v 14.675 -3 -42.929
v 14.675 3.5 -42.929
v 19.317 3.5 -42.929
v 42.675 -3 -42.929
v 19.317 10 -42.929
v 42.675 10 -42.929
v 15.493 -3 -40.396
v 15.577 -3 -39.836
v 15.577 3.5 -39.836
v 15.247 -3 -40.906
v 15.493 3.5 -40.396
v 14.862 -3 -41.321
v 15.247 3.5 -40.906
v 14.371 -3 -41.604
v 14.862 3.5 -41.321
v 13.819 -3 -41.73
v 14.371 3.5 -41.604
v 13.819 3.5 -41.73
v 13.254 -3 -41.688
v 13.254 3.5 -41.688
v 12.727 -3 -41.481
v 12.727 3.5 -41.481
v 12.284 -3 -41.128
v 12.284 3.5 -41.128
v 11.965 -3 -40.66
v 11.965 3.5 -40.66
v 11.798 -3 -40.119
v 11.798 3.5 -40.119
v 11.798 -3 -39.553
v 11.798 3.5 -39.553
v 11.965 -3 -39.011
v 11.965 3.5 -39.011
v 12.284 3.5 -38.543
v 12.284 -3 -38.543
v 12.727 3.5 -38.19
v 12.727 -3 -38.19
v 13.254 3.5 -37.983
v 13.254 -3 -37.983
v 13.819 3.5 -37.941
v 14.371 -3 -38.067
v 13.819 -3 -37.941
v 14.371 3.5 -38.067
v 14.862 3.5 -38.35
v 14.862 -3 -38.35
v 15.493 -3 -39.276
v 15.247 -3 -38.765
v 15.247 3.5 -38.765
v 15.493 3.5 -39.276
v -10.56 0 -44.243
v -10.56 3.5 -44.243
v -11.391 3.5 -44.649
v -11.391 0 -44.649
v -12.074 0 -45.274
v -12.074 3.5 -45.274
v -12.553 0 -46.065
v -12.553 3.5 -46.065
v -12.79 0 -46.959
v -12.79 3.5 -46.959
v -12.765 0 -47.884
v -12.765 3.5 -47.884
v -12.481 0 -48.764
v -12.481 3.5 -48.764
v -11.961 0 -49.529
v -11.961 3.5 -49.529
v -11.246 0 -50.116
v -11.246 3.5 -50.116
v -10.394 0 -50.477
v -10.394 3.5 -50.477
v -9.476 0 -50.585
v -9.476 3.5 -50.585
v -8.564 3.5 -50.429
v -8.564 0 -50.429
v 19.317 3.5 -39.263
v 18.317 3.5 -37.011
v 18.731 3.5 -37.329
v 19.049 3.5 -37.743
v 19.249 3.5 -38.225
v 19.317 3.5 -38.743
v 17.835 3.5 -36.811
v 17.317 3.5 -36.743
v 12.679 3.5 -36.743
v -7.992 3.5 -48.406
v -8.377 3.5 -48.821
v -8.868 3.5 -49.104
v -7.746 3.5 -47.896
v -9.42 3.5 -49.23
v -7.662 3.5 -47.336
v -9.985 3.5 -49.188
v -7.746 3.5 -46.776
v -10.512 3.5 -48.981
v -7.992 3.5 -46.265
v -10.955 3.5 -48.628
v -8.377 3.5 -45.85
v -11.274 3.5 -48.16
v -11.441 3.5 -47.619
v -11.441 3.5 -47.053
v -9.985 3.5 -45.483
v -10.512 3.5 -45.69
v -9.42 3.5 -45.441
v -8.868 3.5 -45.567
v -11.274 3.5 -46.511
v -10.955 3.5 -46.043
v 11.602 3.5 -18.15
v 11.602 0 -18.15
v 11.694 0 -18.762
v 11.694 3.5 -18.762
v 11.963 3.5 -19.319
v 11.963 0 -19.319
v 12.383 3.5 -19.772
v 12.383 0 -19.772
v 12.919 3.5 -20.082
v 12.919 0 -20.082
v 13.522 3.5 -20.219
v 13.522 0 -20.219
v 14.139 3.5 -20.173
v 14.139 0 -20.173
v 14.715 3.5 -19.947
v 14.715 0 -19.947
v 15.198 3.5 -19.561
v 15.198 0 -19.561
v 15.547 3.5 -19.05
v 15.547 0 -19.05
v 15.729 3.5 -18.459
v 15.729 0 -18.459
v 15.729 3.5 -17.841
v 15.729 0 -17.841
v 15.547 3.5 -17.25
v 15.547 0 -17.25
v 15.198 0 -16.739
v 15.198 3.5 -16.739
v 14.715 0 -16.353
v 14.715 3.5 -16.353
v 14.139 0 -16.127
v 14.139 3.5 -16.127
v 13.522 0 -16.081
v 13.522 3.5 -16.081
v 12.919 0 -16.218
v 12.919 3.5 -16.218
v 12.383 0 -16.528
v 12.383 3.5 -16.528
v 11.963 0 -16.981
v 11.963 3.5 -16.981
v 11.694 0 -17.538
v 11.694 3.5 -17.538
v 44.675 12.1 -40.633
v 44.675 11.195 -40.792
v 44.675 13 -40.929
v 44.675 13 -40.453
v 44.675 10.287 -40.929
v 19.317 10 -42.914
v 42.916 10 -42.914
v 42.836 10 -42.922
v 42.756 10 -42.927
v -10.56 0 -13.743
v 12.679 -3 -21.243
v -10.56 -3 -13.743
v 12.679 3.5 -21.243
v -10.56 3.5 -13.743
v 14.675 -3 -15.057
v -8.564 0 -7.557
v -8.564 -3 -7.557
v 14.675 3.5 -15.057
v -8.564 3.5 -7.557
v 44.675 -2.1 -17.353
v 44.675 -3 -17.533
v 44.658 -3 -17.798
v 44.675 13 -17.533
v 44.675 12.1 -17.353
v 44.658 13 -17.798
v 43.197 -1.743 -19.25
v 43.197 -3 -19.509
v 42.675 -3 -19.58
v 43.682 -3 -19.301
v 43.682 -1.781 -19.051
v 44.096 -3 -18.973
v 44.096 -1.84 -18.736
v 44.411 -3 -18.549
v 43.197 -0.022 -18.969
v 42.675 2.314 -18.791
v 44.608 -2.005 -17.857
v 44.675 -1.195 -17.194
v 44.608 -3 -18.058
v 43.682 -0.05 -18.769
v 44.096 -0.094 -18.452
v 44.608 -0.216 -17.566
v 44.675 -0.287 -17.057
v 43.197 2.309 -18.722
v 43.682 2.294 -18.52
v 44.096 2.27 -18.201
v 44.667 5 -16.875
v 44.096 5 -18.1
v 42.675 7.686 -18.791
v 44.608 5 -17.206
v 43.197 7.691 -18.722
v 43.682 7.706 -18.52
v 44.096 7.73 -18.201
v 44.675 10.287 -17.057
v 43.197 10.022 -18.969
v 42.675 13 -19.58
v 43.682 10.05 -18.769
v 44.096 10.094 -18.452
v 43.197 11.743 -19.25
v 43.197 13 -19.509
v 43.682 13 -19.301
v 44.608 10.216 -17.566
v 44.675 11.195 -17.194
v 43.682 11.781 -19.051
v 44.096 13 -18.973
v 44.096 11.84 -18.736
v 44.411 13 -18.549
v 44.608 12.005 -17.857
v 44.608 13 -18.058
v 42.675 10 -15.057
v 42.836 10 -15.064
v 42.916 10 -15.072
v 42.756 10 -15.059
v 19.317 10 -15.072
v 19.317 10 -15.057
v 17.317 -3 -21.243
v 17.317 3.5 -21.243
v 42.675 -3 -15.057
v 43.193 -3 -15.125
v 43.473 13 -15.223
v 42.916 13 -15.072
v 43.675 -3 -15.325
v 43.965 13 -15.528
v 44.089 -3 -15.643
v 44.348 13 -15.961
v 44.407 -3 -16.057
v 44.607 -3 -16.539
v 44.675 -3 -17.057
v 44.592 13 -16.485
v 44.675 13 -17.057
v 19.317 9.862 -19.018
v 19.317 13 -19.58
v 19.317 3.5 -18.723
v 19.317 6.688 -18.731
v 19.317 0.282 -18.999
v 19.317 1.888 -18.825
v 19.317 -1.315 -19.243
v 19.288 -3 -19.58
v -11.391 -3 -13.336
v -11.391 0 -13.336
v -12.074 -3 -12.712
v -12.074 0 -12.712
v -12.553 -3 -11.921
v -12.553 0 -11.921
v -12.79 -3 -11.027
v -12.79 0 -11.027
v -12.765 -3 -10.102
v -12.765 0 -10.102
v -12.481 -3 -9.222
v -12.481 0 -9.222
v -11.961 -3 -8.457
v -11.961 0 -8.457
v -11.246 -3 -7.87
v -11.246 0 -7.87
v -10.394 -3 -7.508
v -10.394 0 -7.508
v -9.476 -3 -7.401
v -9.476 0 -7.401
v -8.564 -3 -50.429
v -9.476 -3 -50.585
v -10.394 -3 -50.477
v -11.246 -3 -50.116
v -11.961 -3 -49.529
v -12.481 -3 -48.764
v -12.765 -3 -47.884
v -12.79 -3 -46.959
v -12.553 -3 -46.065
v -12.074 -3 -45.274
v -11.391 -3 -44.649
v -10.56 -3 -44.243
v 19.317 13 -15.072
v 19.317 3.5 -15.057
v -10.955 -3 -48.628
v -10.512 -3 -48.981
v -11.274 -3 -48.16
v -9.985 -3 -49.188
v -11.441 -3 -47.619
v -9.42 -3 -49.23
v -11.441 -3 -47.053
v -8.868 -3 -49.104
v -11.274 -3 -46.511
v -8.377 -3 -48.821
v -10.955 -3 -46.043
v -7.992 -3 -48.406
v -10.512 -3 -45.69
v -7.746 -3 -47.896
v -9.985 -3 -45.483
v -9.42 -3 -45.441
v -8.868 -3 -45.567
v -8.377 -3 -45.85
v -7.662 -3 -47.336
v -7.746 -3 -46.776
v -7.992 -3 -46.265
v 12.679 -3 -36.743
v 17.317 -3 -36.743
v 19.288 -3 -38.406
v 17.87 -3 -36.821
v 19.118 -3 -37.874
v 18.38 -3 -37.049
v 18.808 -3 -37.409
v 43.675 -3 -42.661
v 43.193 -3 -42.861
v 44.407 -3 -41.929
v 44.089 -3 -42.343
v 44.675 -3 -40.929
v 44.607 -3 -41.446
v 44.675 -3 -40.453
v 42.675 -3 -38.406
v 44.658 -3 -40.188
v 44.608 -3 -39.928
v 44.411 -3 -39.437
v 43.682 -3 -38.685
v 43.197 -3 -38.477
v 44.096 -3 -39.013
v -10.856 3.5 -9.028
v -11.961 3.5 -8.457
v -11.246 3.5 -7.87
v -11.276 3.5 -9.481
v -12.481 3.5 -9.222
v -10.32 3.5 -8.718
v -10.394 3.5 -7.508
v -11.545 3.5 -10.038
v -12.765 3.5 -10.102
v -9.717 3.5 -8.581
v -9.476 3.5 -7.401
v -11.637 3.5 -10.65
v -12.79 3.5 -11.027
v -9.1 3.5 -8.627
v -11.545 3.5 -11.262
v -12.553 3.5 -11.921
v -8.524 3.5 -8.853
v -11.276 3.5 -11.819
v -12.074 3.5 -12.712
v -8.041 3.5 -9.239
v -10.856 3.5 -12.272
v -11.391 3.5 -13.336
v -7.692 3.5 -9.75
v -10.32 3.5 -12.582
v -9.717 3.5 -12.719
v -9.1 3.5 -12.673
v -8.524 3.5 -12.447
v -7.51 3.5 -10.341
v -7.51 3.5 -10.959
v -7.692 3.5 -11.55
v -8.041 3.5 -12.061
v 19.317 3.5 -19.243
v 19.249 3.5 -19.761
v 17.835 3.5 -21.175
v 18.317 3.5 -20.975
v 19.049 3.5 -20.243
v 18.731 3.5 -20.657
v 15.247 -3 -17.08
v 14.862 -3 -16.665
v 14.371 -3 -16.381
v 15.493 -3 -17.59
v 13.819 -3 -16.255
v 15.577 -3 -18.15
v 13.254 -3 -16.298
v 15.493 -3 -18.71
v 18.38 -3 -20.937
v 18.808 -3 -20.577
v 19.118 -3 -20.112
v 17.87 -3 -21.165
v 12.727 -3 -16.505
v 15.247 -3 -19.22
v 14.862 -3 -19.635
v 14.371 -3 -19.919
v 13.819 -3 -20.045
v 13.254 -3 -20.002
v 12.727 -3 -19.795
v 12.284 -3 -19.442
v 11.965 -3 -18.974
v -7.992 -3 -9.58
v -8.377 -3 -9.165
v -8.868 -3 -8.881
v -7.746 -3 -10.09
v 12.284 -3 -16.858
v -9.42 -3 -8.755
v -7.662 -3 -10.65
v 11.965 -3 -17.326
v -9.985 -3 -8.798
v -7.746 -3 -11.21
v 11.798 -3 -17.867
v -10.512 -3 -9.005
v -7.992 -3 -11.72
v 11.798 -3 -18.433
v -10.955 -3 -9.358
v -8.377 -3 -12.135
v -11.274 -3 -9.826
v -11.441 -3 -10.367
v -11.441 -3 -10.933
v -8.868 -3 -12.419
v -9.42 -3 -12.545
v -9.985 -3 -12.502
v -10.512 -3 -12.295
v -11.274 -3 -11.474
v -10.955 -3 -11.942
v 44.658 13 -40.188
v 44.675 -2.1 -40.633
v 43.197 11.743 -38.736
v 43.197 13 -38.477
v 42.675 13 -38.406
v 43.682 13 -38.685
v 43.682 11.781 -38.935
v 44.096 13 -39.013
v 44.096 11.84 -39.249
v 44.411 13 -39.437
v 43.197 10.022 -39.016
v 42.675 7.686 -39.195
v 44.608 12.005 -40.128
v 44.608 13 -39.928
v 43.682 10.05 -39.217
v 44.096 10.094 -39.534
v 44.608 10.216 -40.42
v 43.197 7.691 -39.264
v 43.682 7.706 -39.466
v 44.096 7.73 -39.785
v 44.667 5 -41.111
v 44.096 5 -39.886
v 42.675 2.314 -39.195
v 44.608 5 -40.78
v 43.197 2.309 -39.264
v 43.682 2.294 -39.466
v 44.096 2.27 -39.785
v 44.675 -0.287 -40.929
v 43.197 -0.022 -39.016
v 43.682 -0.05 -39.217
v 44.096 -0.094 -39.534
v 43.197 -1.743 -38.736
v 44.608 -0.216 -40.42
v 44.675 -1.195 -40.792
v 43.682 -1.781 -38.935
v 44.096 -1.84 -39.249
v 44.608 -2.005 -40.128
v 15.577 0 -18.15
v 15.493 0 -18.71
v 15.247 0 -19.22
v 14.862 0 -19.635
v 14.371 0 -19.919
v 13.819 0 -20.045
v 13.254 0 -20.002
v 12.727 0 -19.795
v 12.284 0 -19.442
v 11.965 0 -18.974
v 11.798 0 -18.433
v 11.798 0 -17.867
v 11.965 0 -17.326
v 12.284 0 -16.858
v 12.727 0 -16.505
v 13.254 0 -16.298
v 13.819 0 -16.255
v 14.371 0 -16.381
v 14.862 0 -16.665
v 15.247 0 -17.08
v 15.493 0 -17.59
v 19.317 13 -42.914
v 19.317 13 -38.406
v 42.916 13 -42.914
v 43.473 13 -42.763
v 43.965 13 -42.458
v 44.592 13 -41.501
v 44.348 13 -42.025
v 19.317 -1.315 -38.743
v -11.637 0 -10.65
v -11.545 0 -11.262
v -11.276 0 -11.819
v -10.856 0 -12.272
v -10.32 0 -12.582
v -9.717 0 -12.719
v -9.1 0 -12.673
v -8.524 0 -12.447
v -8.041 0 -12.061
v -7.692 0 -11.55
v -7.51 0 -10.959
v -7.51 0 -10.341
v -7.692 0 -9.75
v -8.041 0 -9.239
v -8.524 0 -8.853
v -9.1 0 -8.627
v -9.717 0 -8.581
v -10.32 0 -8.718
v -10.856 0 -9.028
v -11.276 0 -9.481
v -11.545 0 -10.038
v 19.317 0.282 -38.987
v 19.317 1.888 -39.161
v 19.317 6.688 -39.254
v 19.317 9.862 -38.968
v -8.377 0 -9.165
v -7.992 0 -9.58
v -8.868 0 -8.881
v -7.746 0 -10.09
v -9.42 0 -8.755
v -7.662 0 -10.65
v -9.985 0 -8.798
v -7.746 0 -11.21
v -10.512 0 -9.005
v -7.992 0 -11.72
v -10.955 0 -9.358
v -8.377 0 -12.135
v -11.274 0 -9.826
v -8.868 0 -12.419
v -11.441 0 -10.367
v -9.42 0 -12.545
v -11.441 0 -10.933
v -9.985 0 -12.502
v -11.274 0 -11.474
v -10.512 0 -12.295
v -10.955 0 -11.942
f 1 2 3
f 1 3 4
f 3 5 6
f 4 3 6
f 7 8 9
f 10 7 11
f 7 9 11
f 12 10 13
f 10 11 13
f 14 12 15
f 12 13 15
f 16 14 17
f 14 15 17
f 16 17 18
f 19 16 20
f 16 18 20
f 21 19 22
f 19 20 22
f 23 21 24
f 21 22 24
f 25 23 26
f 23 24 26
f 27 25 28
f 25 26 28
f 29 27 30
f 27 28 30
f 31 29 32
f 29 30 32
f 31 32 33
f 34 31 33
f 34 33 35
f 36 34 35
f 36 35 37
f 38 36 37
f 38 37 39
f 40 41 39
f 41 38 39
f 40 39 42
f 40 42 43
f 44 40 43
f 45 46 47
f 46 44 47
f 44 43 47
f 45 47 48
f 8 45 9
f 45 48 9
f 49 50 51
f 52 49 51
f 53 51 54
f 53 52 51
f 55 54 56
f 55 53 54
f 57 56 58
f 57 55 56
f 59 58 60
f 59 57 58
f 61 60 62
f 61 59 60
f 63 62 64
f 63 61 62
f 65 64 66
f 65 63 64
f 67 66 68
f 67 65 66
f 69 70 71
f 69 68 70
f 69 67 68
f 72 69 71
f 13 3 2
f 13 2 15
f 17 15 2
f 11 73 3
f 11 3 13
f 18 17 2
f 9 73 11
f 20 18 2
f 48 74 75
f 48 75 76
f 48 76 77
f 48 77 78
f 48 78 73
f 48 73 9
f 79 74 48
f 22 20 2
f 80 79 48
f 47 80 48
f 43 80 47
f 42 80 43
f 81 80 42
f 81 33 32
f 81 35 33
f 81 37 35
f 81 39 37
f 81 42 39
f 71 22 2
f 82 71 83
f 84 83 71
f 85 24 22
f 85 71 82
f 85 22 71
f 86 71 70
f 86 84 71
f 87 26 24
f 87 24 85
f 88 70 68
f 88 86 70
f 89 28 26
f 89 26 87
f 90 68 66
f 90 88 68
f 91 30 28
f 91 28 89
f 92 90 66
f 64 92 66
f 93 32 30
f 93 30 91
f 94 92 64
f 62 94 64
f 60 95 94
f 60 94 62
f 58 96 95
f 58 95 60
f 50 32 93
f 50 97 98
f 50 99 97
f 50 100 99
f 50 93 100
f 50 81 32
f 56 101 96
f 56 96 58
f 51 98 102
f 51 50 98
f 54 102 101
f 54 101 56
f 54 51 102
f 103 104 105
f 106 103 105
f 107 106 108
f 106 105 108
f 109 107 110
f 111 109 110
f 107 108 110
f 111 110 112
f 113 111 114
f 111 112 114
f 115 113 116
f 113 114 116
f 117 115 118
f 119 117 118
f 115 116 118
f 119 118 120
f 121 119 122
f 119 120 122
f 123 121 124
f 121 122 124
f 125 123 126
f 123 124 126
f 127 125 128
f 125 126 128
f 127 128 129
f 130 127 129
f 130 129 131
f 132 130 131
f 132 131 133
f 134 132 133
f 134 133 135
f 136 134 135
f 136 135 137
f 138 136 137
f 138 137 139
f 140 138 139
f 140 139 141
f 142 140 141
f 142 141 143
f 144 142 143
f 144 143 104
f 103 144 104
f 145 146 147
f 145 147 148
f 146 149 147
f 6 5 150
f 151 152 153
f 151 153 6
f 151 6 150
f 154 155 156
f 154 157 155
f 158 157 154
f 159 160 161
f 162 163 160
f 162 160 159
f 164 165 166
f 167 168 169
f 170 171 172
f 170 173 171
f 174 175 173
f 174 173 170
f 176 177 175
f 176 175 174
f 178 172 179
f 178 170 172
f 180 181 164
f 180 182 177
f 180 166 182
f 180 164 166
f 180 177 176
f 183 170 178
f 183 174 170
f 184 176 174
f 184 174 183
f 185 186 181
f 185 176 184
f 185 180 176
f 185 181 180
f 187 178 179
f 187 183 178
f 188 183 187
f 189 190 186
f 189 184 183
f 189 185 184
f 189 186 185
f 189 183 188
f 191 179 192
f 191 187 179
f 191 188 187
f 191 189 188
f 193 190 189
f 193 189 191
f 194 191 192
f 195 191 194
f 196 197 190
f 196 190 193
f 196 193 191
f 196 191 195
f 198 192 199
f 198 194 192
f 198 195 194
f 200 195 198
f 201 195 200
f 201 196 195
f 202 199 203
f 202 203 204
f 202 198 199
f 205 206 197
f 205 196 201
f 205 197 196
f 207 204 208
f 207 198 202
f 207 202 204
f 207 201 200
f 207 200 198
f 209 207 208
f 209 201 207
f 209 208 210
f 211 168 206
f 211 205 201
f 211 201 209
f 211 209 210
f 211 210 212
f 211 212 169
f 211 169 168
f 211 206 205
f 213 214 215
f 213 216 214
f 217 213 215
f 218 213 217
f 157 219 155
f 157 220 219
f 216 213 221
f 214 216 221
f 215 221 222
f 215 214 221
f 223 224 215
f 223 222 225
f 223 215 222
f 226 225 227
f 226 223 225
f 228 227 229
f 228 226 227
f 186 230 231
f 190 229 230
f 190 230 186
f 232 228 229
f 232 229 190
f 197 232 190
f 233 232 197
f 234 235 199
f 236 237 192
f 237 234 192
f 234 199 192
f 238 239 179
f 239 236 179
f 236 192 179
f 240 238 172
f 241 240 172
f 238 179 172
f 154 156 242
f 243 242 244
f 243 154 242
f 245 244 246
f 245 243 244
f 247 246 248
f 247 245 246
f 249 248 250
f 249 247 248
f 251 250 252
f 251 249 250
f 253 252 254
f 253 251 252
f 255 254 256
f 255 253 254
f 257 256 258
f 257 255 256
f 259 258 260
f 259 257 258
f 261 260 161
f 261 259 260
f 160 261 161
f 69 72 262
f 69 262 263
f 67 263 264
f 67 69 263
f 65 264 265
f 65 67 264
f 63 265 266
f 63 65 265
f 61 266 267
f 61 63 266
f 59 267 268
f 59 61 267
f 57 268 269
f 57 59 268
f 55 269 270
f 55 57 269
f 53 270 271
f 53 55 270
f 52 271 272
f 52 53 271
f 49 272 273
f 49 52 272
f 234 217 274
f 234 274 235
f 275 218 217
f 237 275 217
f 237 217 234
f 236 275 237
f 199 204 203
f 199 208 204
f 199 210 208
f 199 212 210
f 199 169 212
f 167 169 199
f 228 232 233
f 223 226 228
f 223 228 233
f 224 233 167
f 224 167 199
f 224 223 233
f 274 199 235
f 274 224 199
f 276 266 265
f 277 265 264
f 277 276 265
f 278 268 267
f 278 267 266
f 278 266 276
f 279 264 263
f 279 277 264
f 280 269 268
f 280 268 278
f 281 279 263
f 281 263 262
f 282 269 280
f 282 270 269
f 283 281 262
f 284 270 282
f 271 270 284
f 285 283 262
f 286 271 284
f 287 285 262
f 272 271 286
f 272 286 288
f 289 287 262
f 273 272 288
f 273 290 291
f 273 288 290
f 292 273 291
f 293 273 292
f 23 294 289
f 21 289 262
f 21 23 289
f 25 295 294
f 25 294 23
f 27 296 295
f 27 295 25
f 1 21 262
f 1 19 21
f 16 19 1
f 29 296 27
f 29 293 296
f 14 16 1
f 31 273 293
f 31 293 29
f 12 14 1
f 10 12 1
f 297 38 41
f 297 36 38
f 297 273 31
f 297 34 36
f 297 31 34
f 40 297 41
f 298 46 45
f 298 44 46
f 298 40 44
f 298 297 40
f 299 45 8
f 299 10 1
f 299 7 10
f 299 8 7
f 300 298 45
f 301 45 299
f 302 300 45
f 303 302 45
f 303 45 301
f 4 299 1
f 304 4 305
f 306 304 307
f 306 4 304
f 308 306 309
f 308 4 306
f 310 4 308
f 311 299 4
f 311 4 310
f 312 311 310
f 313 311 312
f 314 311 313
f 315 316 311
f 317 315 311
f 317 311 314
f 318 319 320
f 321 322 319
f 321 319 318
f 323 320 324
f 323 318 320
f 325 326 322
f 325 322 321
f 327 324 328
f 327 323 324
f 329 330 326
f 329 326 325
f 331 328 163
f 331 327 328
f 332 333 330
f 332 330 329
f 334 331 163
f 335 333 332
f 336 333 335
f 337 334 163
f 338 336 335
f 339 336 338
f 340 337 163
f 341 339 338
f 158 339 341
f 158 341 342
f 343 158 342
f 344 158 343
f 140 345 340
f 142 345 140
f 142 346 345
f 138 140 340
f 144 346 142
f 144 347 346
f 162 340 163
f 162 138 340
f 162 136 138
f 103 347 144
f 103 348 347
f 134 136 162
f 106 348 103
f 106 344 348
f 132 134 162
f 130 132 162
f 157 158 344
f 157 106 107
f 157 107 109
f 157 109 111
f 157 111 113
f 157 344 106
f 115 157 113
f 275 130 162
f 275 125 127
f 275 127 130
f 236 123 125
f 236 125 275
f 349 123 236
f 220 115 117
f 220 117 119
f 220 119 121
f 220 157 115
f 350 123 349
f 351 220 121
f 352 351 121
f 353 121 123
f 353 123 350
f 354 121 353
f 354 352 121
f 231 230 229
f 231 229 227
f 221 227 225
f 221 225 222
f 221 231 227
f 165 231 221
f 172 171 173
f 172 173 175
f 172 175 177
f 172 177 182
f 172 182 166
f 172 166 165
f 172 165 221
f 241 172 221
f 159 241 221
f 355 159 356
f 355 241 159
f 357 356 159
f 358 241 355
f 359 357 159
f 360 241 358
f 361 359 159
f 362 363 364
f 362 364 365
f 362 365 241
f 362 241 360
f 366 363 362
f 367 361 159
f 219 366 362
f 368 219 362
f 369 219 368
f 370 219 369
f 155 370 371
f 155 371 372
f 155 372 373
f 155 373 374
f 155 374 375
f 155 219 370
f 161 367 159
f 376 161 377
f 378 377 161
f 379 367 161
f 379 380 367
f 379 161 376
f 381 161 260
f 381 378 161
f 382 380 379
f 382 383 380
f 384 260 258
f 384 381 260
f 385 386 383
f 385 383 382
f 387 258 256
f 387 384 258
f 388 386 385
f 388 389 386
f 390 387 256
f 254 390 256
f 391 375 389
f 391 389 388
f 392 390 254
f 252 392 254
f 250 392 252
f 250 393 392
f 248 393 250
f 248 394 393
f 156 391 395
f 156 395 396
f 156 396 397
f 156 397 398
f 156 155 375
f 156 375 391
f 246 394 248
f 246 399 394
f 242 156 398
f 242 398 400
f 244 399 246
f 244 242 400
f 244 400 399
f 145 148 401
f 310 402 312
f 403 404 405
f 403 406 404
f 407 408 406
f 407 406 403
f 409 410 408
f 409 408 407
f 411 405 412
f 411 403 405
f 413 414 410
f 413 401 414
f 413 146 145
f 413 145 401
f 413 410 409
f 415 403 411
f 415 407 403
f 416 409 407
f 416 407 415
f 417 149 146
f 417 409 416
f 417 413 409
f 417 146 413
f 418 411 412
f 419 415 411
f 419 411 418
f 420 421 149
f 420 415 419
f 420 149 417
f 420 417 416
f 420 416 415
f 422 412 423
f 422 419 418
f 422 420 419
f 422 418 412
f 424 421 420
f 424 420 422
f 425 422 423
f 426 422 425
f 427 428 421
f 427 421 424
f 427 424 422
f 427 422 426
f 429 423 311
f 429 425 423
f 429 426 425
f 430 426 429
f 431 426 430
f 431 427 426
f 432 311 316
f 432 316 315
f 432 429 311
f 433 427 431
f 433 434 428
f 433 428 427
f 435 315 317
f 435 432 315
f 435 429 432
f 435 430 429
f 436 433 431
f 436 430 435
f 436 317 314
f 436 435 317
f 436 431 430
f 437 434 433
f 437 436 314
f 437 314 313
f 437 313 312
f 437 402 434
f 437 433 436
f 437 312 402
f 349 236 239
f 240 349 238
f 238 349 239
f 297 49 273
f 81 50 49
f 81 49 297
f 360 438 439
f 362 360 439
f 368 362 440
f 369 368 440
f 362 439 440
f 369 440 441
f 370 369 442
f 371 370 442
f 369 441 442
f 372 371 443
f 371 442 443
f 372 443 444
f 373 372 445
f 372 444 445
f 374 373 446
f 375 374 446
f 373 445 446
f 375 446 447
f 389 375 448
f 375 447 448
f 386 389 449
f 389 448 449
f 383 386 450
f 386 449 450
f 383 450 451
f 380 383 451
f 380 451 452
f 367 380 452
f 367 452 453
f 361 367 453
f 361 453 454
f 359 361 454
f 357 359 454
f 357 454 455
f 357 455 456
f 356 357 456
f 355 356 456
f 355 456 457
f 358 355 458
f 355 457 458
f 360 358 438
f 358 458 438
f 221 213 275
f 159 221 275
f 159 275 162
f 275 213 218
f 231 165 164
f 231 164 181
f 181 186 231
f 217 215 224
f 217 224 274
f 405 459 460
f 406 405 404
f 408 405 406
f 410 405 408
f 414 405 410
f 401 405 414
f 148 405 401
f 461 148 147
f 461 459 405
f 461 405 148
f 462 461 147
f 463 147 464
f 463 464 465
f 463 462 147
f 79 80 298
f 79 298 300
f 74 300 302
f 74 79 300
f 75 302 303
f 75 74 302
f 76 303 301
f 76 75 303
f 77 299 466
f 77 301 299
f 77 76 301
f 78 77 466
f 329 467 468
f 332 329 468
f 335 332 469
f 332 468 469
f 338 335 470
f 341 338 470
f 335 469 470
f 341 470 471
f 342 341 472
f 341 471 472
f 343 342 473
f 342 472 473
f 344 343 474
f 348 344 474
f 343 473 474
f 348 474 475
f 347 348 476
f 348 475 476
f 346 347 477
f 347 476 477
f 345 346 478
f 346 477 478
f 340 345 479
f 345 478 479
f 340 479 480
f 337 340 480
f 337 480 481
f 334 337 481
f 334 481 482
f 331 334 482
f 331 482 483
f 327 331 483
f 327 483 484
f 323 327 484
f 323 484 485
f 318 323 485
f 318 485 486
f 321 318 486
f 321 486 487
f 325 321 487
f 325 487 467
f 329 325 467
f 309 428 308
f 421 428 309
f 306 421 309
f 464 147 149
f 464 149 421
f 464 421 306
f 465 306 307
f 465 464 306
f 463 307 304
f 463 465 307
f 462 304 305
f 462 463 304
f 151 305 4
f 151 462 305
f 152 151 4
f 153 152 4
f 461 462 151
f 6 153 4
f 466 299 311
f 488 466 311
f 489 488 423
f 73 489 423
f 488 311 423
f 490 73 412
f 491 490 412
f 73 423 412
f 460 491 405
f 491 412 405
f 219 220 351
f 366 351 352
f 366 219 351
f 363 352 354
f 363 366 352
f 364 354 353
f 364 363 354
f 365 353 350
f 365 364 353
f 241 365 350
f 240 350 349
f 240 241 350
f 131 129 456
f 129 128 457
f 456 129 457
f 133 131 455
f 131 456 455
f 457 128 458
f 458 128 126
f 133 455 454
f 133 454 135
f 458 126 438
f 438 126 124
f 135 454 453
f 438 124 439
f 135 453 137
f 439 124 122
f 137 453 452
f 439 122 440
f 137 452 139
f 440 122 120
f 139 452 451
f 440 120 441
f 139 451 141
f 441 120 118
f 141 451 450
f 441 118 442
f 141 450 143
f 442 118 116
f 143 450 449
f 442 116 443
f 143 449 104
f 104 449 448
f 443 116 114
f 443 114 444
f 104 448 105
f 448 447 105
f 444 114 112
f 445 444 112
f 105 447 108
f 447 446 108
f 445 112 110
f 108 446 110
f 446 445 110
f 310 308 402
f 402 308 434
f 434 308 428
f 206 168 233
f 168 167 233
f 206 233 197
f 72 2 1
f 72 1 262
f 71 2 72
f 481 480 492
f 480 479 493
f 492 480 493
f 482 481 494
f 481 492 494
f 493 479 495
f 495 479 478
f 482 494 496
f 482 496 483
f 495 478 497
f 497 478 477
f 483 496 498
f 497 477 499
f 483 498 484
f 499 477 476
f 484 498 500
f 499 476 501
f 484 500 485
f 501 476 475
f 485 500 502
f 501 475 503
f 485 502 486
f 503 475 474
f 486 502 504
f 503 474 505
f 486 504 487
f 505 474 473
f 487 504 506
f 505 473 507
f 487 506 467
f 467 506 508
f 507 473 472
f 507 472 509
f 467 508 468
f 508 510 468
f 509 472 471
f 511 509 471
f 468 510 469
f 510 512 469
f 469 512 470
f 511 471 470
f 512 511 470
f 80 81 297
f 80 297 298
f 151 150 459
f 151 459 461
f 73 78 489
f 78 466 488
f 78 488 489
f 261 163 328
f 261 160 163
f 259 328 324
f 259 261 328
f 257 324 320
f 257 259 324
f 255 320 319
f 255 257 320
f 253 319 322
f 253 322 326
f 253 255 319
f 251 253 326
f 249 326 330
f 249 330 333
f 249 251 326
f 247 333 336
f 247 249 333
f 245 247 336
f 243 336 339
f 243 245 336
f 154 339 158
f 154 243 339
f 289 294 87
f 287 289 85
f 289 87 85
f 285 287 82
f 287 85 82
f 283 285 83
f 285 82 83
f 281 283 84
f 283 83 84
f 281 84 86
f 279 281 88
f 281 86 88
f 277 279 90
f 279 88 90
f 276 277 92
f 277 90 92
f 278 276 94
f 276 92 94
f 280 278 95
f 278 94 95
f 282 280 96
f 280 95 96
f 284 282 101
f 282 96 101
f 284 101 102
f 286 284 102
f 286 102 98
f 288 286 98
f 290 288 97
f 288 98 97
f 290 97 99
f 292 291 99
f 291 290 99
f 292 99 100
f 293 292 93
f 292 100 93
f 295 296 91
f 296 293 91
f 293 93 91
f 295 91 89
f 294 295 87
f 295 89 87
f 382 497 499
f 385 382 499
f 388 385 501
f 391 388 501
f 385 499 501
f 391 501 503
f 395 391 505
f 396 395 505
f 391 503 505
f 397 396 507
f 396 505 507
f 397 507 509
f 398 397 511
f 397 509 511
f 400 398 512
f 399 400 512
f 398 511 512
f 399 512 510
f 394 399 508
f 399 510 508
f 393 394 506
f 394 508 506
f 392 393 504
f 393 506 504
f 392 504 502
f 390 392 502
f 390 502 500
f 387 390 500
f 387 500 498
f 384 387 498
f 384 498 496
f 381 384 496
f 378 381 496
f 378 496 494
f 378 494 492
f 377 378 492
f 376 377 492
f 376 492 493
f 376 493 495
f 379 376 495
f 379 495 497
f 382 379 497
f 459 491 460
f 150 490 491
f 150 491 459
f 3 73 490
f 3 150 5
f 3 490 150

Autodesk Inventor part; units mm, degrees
ref_plane "YZ Plane" through (0, 0, 0) normal (1, 0, 0) x (0, 1, 0)
ref_plane "XZ Plane" through (0, 0, 0) normal (0, 1, 0) x (-1, 0, 0)
ref_plane "XY Plane" through (0, 0, 0) normal (0, 0, 1) x (1, 0, 0)
sketch "Sketch1" plane through (0, 0, 0) normal (0, 1, 0) x (-1, 0, 0)
  line L0 (27.1998, -28.5532) -> (-70.2595, -28.5532)
  circle A0 centre (9.562, -47.3358) radius 2.075
  arc A1 (8.5638, -50.4287) -> (10.5601, -44.2429) centre (9.562, -47.3358) ccw
  circle A2 centre (-13.677, -39.8358) radius 2.075
  line L1 (10.5601, -44.2429) -> (-12.6789, -36.7429)
  line L2 (8.5638, -50.4287) -> (-14.6752, -42.9287)
  line L3 (-14.6752, -42.9287) -> (-44.6752, -42.9287)
  line L4 (-12.6789, -36.7429) -> (-19.3171, -36.7429)
  line L5 (-44.6752, -38.4058) -> (-44.6752, -42.9287)
  line L6 (-19.3171, -36.7429) -> (-44.6752, -38.4058)
  circle A3 centre (9.562, -9.7705) radius 2.075
  arc A4 (10.5601, -12.8635) -> (8.5638, -6.6776) centre (9.562, -9.7705) ccw
  circle A5 centre (-13.677, -17.2705) radius 2.075
  line L7 (10.5601, -12.8635) -> (-12.6789, -20.3635)
  line L8 (8.5638, -6.6776) -> (-14.6752, -14.1776)
  line L9 (-14.6752, -14.1776) -> (-44.6752, -14.1776)
  line L10 (-12.6789, -20.3635) -> (-19.3171, -20.3635)
  line L11 (-44.6752, -18.7005) -> (-44.6752, -14.1776)
  line L12 (-19.3171, -20.3635) -> (-44.6752, -18.7005)
  dimension "d26" = 4.15
extrude "Extrusion1" add sketch "Sketch1" along normal blind 3.5 contours L2 L3 L5 L6 L4 L1 A1
sketch "Sketch2" plane through (0, 3.5, 0) normal (0, 1, 0) x (1, 0, 0)
  line L0 (19.3171, 36.7429) -> (44.6752, 38.4058) projected
  line L1 (19.3171, 36.7429) -> (44.6752, 38.4058)
  line L2 (19.3171, 36.7429) -> (19.3171, 42.9287)
  line L3 (44.6752, 42.9287) -> (14.6752, 42.9287) projected
  line L4 (19.3171, 42.9287) -> (44.6752, 42.9287)
  line L5 (44.6752, 42.9287) -> (44.6752, 38.4058)
  point P0 (0, 0)
  point P1 (44.6752, 18.7005)
  point P2 (19.3171, 20.3635)
  point P3 (44.6752, 14.1776)
extrude "Extrusion2" add sketch "Sketch2" along normal blind 6.5
sketch "Sketch4" plane through (0, 10, 0) normal (0, 1, 0) x (1, 0, 0)
  line L0 (19.3171, 36.7429) -> (44.6752, 38.4058) projected
  line L1 (19.3171, 36.7429) -> (19.3171, 42.9142)
  line L2 (19.3171, 42.9142) -> (44.6752, 42.9142)
  line L3 (44.6752, 38.4058) -> (44.6752, 42.9287) projected
  line L4 (44.6752, 42.9142) -> (44.6752, 38.4058)
  line L5 (44.6752, 38.4058) -> (19.3171, 36.7429)
  point P0 (0, 0)
extrude "Extrusion4" add sketch "Sketch4" along normal blind 3
sketch "Sketch5" plane through (0, 0, 0) normal (0, -1, 0) x (1, 0, 0)
  line L0 (14.6752, -42.9287) -> (-8.5638, -50.4287) projected
  line L1 (44.6752, -42.9287) -> (19.3171, -42.9287) projected
  line L2 (14.6752, -42.9287) -> (44.6752, -42.9287)
  line L3 (19.3171, -36.7429) -> (44.6752, -38.4058) projected
  line L4 (44.6752, -42.9287) -> (44.6752, -38.4058)
  line L5 (44.6752, -38.4058) -> (19.3171, -36.7429)
  line L6 (12.6789, -36.7429) -> (19.3171, -36.7429) projected
  line L7 (19.3171, -36.7429) -> (12.6789, -36.7429)
  line L8 (-10.5601, -44.2429) -> (12.6789, -36.7429) projected
  line L9 (12.6789, -36.7429) -> (-10.5601, -44.2429)
  arc A0 (-10.5601, -44.2429) -> (-8.5638, -50.4287) centre (-9.562, -47.3358) ccw
  circle A1 centre (-9.562, -47.3358) radius 1.9
  circle A2 centre (13.677, -39.8358) radius 1.9
  point P0 (0, 0)
  dimension "d27" = 3.8
  dimension "d28" = 3.8
extrude "Extrusion5" add sketch "Sketch5" along normal blind 3
sketch "Sketch6" plane through (-9.562, 0, -47.3358) normal (0, 1, 0) x (1, 0, 0)
  circle A0 centre (0, 0) radius 1.9
  circle A1 centre (0, 0) radius 2.075
  circle A2 centre (23.239, -7.5) radius 1.9 projected
  circle A3 centre (23.239, -7.5) radius 1.9
  circle A4 centre (23.239, -7.5) radius 2.075
  point P0 (9.562, -47.3358)
extrude "Extrusion6" add sketch "Sketch6" along normal up to surface (3.5 mm away)
sketch "Sketch7" plane through (44.6752, 10, -42.9142) normal (1, 0, 0) x (0, 0, -1)
  line L0 (-6.1713, 3) -> (-4.5084, 3) projected
  arc A0 (-4.5084, -13) -> (-4.5084, 3) centre (-40.1117, -5) ccw
  line L1 (0.0145, -13) -> (-4.5084, -13) projected
  line L2 (-4.5084, 3) -> (-14.8639, 3)
  line L3 (-14.8639, 3) -> (-14.8639, -13)
  line L4 (-14.8639, -13) -> (-4.5084, -13)
  line L5 (-4.5084, -13) -> (-4.5084, 3)
  point P0 (-42.9142, -10)
extrude "Extrusion7" cut sketch "Sketch7" against normal up to surface (25.3581 mm away)
fillet "Fillet4" radius 2 1 edges at (19.3171, 0.25, -36.7429)
fillet "Fillet5" radius 2 2 edges at (44.6752, 5, -39.2935) (44.6752, 3.5, -42.9287)
ref_plane "Work Plane1" through (12.6789, -3, -28.9929) normal (0, 0, 1) x (1, 0, 0)
mirror "Mirror1" about plane through (12.6789, -3, -28.9929) normal (0, 0, 1) of "Extrusion1", "Extrusion5", "Fillet4", "Extrusion7", "Extrusion4", "Fillet5", "Extrusion2"
properties part number "grips"
